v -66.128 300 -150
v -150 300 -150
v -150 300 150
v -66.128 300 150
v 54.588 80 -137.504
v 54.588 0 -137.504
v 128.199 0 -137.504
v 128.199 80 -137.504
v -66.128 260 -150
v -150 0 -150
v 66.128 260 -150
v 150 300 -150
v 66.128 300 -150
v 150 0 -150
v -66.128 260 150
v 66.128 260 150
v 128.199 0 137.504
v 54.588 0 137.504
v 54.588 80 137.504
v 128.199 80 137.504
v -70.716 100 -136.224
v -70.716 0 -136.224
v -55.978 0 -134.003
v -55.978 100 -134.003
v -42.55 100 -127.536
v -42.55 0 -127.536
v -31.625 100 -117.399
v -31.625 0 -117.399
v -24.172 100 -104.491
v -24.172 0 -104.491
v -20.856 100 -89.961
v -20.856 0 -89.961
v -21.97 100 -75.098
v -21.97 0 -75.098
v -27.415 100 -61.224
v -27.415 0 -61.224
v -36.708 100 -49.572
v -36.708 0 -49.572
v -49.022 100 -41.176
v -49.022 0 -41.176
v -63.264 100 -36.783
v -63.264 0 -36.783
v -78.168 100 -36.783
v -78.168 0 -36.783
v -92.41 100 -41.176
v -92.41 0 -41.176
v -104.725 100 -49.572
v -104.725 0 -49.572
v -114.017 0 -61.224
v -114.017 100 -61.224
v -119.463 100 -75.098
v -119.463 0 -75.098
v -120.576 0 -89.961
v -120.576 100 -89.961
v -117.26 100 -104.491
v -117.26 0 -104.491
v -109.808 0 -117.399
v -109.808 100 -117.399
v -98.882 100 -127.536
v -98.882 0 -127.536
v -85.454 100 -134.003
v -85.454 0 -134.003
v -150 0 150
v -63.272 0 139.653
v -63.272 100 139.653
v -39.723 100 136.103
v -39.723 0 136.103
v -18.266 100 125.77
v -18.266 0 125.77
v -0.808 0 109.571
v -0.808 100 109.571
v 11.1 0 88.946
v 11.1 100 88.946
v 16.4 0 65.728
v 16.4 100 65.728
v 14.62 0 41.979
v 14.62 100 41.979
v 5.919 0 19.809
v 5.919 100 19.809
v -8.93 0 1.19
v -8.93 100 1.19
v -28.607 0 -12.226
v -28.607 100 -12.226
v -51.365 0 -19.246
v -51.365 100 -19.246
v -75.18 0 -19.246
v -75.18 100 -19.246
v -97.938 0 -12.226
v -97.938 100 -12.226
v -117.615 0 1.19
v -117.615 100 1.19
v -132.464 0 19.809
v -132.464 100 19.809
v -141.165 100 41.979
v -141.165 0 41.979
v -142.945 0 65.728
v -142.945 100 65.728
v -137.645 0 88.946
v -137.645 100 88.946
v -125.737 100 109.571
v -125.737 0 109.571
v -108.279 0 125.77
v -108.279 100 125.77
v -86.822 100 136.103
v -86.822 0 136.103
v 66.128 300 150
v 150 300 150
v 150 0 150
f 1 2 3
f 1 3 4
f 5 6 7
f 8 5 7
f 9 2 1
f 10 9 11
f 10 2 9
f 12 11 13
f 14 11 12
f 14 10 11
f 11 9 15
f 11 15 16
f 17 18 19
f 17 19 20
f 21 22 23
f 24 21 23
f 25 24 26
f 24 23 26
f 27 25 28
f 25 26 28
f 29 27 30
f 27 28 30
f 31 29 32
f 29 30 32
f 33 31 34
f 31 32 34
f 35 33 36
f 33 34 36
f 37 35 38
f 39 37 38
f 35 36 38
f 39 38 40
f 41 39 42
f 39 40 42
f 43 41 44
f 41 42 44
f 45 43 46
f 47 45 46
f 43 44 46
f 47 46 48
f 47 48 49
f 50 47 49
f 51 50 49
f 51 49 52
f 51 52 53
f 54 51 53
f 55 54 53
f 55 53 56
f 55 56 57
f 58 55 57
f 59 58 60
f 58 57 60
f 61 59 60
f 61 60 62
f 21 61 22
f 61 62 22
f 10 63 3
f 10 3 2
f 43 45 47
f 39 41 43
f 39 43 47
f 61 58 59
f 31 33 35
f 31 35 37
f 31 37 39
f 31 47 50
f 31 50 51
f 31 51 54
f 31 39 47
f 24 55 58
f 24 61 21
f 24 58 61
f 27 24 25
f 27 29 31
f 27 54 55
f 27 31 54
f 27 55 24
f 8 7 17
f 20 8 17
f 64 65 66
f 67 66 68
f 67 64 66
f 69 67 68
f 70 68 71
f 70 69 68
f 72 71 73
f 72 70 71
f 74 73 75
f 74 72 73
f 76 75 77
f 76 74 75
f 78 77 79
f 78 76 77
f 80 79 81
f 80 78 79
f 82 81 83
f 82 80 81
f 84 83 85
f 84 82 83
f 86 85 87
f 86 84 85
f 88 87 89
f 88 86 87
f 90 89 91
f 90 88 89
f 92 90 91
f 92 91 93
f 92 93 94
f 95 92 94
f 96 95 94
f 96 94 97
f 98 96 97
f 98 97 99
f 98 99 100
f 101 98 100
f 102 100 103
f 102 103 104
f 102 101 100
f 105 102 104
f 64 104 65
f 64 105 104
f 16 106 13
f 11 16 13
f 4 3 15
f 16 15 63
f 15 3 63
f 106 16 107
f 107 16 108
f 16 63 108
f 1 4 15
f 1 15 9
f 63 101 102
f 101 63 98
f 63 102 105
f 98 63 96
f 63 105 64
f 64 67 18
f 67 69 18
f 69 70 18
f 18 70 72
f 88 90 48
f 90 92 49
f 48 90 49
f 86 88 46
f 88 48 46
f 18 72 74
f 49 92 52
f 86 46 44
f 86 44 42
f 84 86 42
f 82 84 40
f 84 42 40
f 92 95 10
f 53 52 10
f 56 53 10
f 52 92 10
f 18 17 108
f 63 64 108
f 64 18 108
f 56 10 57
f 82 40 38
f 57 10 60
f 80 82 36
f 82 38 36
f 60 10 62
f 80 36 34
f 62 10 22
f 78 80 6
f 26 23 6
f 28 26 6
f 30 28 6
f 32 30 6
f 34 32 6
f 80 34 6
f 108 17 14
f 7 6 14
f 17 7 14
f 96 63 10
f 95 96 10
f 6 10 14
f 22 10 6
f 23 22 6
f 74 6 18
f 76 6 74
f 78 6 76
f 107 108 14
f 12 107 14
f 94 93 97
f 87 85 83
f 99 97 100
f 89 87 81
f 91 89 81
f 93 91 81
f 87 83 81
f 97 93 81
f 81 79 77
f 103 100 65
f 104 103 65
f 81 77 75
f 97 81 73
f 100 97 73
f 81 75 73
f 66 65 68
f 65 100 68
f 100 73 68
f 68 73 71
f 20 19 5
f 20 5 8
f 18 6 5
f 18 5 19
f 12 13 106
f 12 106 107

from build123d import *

# Parameters (mm, degrees)
SKETCH1_W           = 300
SKETCH1_H           = 300
BOSS_EXTRUDE1_DEPTH = 300
SKETCH3_R           = 79.895545122
CUT_EXTRUDE1_DEPTH  = 100
SKETCH8_R           = 50
CUT_EXTRUDE3_DEPTH  = 100
SKETCH9_W           = 73.610989956
SKETCH9_H           = 275.007350114
CUT_EXTRUDE4_DEPTH  = 80
SKETCH11_W          = 132.256824298
SKETCH11_H          = 300
CUT_EXTRUDE6_DEPTH  = 40


with BuildPart() as part:
    # Sketch1 → Boss-Extrude1 (new body)
    with BuildSketch(Plane(origin=(0, 0, 0), x_dir=(1, 0, 0), z_dir=(0, 1, 0))):
        Rectangle(SKETCH1_W, SKETCH1_H)
    extrude(amount=BOSS_EXTRUDE1_DEPTH)

    # Sketch3 → Cut-Extrude1 (cut)
    with BuildSketch(Plane(origin=(0, 0, 0), x_dir=(1, 0, 0), z_dir=(0, 1, 0))):
        with Locations(Location((-63.272367771, -59.757236228, 0), (0, 0, 270))):
            Circle(SKETCH3_R)
    extrude(amount=CUT_EXTRUDE1_DEPTH, mode=Mode.SUBTRACT)

    # Sketch8 → Cut-Extrude3 (cut)
    with BuildSketch(Plane.XZ):
        with Locations(Location((-70.716175744, -86.224109021, 0), (0, 0, 270))):
            Circle(SKETCH8_R)
    extrude(amount=-CUT_EXTRUDE3_DEPTH, mode=Mode.SUBTRACT)

    # Sketch9 → Cut-Extrude4 (cut)
    with BuildSketch(Plane.XZ):
        with Locations((91.393420113, 0)):
            Rectangle(SKETCH9_W, SKETCH9_H)
    extrude(amount=-CUT_EXTRUDE4_DEPTH, mode=Mode.SUBTRACT)

    # Sketch11 → Cut-Extrude6 (cut)
    with BuildSketch(Plane(origin=(0, 300, 0), x_dir=(1, 0, 0), z_dir=(0, 1, 0))):
        Rectangle(SKETCH11_W, SKETCH11_H)
    extrude(amount=-CUT_EXTRUDE6_DEPTH, mode=Mode.SUBTRACT)


solid = part.part
